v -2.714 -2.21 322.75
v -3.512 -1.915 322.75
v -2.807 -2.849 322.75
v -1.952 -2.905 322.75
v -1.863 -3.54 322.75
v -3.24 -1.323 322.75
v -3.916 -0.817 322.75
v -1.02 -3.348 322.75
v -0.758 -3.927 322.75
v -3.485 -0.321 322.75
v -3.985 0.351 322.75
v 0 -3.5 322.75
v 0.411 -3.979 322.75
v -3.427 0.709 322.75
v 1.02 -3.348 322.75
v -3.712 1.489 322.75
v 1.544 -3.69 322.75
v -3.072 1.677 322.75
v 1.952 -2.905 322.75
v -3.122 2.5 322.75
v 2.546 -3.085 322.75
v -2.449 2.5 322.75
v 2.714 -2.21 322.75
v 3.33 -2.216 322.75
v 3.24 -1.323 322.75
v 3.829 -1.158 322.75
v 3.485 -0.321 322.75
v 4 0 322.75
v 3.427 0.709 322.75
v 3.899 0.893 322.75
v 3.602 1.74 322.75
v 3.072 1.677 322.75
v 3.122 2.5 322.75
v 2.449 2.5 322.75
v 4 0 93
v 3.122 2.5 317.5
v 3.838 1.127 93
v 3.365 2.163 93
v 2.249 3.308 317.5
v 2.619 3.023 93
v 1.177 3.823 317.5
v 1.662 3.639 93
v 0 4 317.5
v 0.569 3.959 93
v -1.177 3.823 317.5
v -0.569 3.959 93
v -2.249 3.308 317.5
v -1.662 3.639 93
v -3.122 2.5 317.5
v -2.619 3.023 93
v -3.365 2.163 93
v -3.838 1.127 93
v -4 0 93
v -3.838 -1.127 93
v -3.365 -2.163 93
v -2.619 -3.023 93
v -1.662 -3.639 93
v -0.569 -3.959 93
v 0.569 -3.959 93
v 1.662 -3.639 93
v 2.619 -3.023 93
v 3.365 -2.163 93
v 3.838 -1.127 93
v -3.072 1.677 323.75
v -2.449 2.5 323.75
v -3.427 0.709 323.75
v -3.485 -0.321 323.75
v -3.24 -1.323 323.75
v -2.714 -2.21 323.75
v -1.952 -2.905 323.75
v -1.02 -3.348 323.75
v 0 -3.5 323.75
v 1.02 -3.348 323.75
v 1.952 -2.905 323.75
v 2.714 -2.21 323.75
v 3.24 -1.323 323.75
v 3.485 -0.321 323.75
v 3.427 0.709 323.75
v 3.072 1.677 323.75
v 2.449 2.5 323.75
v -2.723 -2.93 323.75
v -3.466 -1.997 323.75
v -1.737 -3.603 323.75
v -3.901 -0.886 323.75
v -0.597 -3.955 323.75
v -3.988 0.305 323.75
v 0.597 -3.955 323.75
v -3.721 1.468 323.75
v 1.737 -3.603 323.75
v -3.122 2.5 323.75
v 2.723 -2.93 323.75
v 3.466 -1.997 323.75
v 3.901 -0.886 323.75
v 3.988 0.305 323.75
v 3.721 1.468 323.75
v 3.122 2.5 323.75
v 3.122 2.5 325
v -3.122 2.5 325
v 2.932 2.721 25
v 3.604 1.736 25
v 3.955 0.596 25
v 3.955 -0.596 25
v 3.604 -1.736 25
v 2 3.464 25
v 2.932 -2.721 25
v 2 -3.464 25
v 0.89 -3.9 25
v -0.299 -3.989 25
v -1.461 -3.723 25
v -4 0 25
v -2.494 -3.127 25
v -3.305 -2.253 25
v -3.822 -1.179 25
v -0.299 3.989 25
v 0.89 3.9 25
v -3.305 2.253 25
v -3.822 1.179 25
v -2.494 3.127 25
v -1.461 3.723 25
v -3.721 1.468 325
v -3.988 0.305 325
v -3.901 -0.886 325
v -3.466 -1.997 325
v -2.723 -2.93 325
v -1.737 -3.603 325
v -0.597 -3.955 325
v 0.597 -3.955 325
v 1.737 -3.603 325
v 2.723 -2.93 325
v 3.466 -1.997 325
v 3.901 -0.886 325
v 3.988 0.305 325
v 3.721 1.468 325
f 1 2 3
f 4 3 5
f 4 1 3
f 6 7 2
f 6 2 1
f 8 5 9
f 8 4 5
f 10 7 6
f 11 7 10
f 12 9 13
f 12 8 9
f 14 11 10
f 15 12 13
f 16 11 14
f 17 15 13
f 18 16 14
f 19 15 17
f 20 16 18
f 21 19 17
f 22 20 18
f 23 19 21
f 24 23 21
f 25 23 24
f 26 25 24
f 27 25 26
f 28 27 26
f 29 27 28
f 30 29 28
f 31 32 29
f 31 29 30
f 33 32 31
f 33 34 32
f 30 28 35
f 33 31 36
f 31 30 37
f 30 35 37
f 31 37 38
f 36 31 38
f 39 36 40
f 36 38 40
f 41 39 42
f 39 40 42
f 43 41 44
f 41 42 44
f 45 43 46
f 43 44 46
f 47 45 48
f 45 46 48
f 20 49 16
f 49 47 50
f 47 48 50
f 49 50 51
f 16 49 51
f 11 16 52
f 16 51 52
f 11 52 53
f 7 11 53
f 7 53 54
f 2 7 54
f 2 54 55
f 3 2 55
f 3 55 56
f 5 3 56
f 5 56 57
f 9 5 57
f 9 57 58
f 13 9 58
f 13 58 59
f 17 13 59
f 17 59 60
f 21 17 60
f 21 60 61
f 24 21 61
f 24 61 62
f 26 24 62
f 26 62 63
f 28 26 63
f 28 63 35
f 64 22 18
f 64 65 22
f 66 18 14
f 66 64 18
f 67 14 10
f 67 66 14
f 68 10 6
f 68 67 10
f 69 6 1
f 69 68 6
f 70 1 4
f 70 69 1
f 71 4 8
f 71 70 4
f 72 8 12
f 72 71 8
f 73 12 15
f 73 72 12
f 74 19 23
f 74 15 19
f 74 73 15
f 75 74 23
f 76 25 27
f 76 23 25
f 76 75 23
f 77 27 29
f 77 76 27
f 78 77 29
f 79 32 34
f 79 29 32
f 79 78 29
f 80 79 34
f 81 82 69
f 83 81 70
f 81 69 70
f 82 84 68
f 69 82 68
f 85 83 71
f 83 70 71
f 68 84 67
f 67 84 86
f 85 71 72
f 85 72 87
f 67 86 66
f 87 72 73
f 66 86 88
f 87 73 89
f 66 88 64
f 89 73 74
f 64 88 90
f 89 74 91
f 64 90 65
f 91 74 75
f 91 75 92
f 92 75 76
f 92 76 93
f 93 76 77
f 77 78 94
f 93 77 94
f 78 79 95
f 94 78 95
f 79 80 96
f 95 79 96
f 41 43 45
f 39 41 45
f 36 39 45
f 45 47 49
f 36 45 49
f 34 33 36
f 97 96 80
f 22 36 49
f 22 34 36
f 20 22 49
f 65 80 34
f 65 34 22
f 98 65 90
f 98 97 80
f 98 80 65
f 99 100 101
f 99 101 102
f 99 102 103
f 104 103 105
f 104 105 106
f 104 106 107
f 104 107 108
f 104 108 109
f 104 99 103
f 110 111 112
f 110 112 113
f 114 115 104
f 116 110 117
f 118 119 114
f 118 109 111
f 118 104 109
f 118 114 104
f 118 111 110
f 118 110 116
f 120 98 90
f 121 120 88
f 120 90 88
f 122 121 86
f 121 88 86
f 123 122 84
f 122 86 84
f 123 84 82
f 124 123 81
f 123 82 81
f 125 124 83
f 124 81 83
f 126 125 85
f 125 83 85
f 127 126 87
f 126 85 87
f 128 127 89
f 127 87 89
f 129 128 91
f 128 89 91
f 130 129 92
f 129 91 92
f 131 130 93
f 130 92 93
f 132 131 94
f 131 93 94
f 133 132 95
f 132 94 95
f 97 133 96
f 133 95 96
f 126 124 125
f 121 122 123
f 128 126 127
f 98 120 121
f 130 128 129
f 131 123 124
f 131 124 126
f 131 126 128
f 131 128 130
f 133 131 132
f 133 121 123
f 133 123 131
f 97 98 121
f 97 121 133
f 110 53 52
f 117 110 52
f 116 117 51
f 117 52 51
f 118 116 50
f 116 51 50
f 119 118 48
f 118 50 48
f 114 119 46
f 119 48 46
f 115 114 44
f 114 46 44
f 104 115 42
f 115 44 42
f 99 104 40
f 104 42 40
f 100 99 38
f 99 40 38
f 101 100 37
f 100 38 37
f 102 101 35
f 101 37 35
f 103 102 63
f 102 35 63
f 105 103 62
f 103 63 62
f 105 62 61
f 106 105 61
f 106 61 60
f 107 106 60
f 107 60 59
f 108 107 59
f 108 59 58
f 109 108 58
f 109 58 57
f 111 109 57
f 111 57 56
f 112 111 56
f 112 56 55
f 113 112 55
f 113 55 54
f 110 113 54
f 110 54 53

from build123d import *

# Parameters (mm, degrees)
SKETCH1_R           = 4
BOSS_EXTRUDE1_DEPTH = 325
CUT_EXTRUDE1_DEPTH  = 7.5
SKETCH3_R           = 4
SKETCH3_R_2         = 3.5
CUT_EXTRUDE2_DEPTH  = 1
SKETCH5_R           = 4
CUT_EXTRUDE3_DEPTH  = 65
SKETCH6_R           = 4
BOSS_EXTRUDE2_DEPTH = 13
SKETCH7_R           = 4
BOSS_EXTRUDE3_DEPTH = 10
SKETCH8_R           = 4
BOSS_EXTRUDE4_DEPTH = 40
SKETCH9_R           = 4
CUT_EXTRUDE4_DEPTH  = 30
SKETCH10_R          = 4
CUT_EXTRUDE5_DEPTH  = 61
SKETCH11_R          = 4
BOSS_EXTRUDE5_DEPTH = 68


with BuildPart() as part:
    # Sketch1 → Boss-Extrude1 (new body)
    with BuildSketch(Plane.XY):
        Circle(SKETCH1_R)
    extrude(amount=BOSS_EXTRUDE1_DEPTH)

    # Sketch2 → Cut-Extrude1 (cut)
    with BuildSketch(Plane.XY.offset(325)):
        with BuildLine():
            Line((3.122498999, 2.5), (-3.122498999, 2.5))
            ThreePointArc((-3.122498999, 2.5), (0, 4), (3.122498999, 2.5))
        make_face()
    extrude(amount=-CUT_EXTRUDE1_DEPTH, mode=Mode.SUBTRACT)

    # Sketch3 → Cut-Extrude2 (cut)
    with BuildSketch(Plane.XY.offset(323.75)):
        Circle(SKETCH3_R)
        Circle(SKETCH3_R_2, mode=Mode.SUBTRACT)
    extrude(amount=-CUT_EXTRUDE2_DEPTH, mode=Mode.SUBTRACT)

    # Sketch5 → Cut-Extrude3 (cut)
    with BuildSketch(Plane(origin=(0, 0, 0), x_dir=(-1, 0, 0), z_dir=(0, 0, -1))):
        Circle(SKETCH5_R)
    extrude(amount=-CUT_EXTRUDE3_DEPTH, mode=Mode.SUBTRACT)

    # Sketch6 → Boss-Extrude2 (add)
    with BuildSketch(Plane(origin=(0, 0, 65), x_dir=(-1, 0, 0), z_dir=(0, 0, -1))):
        Circle(SKETCH6_R)
    extrude(amount=BOSS_EXTRUDE2_DEPTH)

    # Sketch7 → Boss-Extrude3 (add)
    with BuildSketch(Plane(origin=(0, 0, 52), x_dir=(-1, 0, 0), z_dir=(0, 0, -1))):
        Circle(SKETCH7_R)
    extrude(amount=BOSS_EXTRUDE3_DEPTH)

    # Sketch8 → Boss-Extrude4 (add)
    with BuildSketch(Plane(origin=(0, 0, 42), x_dir=(-1, 0, 0), z_dir=(0, 0, -1))):
        Circle(SKETCH8_R)
    extrude(amount=BOSS_EXTRUDE4_DEPTH)

    # Sketch9 → Cut-Extrude4 (cut)
    with BuildSketch(Plane(origin=(0, 0, 2), x_dir=(-1, 0, 0), z_dir=(0, 0, -1))):
        Circle(SKETCH9_R)
    extrude(amount=-CUT_EXTRUDE4_DEPTH, mode=Mode.SUBTRACT)

    # Sketch10 → Cut-Extrude5 (cut)
    with BuildSketch(Plane(origin=(0, 0, 32), x_dir=(-1, 0, 0), z_dir=(0, 0, -1))):
        Circle(SKETCH10_R)
    extrude(amount=-CUT_EXTRUDE5_DEPTH, mode=Mode.SUBTRACT)

    # Sketch11 → Boss-Extrude5 (add)
    with BuildSketch(Plane(origin=(0, 0, 93), x_dir=(-1, 0, 0), z_dir=(0, 0, -1))):
        Circle(SKETCH11_R)
    extrude(amount=BOSS_EXTRUDE5_DEPTH)


solid = part.part
